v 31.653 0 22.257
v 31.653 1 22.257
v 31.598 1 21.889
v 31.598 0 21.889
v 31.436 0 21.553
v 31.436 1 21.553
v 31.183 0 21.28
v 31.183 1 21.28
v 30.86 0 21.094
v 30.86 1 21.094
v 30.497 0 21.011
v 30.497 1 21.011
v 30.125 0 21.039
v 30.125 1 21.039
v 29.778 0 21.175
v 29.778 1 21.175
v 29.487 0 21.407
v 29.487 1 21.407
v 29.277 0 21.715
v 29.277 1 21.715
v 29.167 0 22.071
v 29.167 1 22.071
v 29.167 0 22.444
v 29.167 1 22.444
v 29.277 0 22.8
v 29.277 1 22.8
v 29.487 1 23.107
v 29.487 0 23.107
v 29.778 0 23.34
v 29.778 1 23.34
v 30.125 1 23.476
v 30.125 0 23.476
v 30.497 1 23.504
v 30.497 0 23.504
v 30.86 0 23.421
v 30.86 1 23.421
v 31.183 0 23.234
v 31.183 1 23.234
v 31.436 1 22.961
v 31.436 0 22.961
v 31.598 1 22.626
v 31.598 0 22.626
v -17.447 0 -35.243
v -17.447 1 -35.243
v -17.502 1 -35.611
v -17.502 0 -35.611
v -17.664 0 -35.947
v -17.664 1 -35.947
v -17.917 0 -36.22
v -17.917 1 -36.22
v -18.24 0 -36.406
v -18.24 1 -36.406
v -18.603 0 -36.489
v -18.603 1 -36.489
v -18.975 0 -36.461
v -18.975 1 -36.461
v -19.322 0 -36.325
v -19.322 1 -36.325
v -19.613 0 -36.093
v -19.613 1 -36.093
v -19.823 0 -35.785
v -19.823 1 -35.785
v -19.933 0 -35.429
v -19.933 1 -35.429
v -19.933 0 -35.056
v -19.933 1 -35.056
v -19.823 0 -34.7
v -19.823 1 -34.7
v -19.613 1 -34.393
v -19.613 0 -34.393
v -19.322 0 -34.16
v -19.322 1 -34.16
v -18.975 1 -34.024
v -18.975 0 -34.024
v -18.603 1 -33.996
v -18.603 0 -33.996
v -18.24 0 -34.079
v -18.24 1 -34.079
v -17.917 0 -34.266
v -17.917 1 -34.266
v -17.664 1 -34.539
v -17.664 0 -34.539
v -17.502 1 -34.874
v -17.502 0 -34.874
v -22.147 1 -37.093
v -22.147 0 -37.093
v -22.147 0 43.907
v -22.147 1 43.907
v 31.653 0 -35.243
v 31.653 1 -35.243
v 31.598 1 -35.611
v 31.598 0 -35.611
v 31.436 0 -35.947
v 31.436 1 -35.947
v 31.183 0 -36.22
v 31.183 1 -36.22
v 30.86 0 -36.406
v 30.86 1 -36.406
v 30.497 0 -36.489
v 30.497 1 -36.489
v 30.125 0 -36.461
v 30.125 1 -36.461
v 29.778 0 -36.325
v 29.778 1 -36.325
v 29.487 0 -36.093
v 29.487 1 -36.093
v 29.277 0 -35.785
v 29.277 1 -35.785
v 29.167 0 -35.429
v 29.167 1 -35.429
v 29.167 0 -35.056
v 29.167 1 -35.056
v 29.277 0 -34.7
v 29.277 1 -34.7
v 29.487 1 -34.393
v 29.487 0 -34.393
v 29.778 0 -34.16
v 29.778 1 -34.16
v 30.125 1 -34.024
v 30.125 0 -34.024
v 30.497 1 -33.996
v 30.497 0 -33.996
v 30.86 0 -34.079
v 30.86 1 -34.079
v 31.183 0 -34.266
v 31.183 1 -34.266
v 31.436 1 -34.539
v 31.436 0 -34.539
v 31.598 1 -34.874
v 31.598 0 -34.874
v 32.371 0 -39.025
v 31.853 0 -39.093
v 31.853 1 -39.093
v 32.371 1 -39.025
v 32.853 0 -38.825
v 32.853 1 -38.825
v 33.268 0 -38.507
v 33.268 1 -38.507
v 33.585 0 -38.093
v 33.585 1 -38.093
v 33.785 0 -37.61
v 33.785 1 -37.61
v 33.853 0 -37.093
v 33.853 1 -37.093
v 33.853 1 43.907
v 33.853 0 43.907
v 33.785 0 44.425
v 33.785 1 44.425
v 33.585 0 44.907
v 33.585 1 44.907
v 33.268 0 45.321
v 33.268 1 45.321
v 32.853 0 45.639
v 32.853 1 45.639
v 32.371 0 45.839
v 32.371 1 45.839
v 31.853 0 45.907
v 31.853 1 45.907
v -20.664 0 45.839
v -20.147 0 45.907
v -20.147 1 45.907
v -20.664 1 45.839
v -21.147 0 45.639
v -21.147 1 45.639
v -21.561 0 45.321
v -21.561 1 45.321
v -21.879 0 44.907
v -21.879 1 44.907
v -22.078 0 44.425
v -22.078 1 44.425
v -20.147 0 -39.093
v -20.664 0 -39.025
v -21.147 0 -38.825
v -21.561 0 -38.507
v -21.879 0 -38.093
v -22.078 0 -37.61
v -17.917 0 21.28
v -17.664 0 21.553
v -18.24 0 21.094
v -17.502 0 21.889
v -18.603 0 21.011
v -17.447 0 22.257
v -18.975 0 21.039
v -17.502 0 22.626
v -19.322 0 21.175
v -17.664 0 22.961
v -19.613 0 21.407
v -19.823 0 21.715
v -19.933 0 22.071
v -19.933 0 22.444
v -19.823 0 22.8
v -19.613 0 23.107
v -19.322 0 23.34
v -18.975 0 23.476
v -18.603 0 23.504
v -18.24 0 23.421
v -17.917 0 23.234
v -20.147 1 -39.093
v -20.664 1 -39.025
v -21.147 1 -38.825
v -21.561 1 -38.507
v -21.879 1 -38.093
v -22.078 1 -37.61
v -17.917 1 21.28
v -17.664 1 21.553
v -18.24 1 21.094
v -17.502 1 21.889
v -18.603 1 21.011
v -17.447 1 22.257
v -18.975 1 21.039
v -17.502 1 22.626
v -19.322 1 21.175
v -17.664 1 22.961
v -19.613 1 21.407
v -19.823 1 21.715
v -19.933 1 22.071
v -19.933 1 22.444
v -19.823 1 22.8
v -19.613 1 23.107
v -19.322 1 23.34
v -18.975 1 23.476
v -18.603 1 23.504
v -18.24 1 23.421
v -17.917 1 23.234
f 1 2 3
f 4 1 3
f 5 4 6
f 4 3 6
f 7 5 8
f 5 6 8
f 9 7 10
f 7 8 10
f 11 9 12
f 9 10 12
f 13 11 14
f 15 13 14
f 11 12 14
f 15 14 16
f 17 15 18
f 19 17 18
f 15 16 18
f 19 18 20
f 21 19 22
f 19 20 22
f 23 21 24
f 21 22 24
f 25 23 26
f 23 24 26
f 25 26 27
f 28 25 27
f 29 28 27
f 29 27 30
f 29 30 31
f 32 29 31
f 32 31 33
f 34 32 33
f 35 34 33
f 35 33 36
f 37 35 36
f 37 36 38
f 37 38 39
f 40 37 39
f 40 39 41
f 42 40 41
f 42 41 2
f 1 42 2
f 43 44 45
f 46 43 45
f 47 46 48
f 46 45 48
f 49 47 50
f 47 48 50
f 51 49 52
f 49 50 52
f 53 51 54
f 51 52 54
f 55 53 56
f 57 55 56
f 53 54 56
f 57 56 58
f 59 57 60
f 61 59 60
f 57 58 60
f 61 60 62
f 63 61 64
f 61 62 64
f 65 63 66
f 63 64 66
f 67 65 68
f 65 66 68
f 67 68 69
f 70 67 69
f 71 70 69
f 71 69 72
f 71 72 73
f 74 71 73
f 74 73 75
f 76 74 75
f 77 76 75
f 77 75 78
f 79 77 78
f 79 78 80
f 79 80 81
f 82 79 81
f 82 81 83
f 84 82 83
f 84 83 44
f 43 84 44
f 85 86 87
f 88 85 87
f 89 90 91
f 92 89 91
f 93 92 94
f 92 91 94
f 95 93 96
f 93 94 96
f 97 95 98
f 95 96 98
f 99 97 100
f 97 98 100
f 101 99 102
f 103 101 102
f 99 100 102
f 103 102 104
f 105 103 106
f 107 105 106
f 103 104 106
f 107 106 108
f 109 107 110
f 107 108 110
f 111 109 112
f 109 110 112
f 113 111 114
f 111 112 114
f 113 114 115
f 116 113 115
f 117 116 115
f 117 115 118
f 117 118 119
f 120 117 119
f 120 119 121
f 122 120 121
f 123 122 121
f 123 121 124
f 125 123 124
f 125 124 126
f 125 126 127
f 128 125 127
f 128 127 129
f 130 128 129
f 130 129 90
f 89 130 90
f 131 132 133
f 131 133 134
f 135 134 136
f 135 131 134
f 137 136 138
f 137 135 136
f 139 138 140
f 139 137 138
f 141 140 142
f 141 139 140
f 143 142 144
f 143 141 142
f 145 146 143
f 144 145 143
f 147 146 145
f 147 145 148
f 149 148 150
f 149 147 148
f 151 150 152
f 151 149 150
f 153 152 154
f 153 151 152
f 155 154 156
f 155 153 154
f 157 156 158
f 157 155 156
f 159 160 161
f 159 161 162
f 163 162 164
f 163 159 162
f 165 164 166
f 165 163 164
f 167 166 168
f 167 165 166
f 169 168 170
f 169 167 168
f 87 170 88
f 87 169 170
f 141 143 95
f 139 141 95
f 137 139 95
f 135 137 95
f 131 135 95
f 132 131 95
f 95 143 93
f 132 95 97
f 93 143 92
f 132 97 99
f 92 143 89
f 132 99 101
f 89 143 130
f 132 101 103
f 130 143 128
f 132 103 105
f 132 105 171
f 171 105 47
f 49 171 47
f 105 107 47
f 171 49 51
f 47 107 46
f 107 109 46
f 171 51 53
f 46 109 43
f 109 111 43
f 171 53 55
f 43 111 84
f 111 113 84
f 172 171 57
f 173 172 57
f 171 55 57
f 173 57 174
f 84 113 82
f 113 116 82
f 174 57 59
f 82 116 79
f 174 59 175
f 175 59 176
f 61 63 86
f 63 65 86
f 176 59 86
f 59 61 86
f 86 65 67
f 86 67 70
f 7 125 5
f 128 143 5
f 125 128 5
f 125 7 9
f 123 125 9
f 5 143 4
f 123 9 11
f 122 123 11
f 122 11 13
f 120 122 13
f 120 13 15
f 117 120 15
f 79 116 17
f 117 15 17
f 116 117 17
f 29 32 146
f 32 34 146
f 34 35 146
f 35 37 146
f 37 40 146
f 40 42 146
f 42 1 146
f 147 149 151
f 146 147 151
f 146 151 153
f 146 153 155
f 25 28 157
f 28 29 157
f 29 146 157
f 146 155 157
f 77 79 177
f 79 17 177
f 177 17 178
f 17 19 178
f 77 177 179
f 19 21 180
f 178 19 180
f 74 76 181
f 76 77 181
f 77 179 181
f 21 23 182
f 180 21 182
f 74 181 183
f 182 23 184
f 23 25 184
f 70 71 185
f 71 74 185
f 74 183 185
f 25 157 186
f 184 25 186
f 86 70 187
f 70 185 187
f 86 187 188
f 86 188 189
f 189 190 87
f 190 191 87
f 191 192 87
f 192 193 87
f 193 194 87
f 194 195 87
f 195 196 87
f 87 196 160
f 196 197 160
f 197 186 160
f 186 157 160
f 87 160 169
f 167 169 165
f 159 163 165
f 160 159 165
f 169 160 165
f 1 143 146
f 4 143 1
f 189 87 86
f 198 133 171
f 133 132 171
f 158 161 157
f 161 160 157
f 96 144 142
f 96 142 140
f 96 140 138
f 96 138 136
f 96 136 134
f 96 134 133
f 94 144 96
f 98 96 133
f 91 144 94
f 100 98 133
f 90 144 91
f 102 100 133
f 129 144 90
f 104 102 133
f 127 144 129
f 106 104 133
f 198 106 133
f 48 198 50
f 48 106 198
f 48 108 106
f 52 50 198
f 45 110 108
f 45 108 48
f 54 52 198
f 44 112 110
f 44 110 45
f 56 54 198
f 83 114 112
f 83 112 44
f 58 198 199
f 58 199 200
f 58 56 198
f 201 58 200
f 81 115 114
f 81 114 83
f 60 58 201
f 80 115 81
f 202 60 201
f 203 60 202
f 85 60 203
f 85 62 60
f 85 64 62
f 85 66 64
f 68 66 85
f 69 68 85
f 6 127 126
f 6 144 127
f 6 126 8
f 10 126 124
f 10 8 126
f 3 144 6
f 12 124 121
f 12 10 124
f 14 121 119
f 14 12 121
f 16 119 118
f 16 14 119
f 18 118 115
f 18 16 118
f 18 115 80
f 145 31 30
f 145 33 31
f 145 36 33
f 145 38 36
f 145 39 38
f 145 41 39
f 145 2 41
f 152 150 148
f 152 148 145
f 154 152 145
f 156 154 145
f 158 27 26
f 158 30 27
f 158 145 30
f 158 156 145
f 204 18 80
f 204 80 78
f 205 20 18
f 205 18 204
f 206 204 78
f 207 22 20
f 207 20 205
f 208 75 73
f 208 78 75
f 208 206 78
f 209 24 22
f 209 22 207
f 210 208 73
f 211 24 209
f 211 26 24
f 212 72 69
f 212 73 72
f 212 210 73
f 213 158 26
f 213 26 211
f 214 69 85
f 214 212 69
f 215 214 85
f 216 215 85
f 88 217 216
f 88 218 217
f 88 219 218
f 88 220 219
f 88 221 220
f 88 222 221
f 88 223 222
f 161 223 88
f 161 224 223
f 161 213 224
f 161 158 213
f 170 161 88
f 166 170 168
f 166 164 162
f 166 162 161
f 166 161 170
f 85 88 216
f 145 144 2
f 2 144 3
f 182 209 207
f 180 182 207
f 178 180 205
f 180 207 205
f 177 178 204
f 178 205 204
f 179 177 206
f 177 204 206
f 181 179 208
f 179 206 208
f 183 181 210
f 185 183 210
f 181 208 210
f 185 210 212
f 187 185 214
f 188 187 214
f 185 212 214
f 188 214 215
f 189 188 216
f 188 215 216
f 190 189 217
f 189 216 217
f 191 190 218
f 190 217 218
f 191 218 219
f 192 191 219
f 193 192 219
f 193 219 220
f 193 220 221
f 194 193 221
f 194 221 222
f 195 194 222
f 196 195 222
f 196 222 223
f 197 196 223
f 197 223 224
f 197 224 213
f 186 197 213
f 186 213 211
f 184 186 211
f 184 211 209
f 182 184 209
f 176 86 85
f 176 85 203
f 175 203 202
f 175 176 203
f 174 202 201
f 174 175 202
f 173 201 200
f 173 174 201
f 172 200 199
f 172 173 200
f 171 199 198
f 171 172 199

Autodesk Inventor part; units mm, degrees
ref_plane "YZ Plane" through (0, 0, 0) normal (1, 0, 0) x (0, 1, 0)
ref_plane "XZ Plane" through (0, 0, 0) normal (0, 1, 0) x (-1, 0, 0)
ref_plane "XY Plane" through (0, 0, 0) normal (0, 0, 1) x (1, 0, 0)
sketch "Sketch1" plane through (0, 0, 0) normal (0, 1, 0) x (-1, 0, 0)
  line L0 (20.1466, 45.9072) -> (-31.8534, 45.9072)
  line L1 (-33.8534, 43.9072) -> (-33.8534, -37.0928)
  line L2 (-31.8534, -39.0928) -> (20.1466, -39.0928)
  line L3 (22.1466, -37.0928) -> (22.1466, 43.9072)
  arc A0 (22.1466, 43.9072) -> (20.1466, 45.9072) centre (20.1466, 43.9072) ccw
  arc A1 (20.1466, -39.0928) -> (22.1466, -37.0928) centre (20.1466, -37.0928) ccw
  arc A2 (-33.8534, -37.0928) -> (-31.8534, -39.0928) centre (-31.8534, -37.0928) ccw
  arc A3 (-31.8534, 45.9072) -> (-33.8534, 43.9072) centre (-31.8534, 43.9072) ccw
  point P0 (0, 0)
  point P1 (22.1466, 45.9072)
  point P2 (-33.8534, -39.0928)
  point P3 (-33.8534, 45.9072)
  point P4 (22.1466, -39.0928)
  dimension "d0" = 85
  dimension "d1" = 56
  dimension "d4" = 2
extrude "Extrusion1" add sketch "Sketch1" along normal blind 1
sketch "Sketch2" plane through (0, 1, 0) normal (0, 1, 0) x (1, 0, 0)
  circle A0 centre (-18.6966, 35.2428) radius 1.25
  line L0 (-22.1466, 37.0928) -> (-22.1466, -43.9072) projected
  line L1 (31.8534, 39.0928) -> (-20.1466, 39.0928) projected
  circle A1 centre (30.4034, 35.2428) radius 1.25
  circle A2 centre (-18.6966, -22.2572) radius 1.25
  circle A3 centre (30.4034, -22.2572) radius 1.25
  line L2 (33.8534, -43.9072) -> (33.8534, 37.0928) projected
  point P0 (0, 0)
  dimension "d5" = 2.5
  dimension "d6" = 3.45
  dimension "d7" = 3.85
  dimension "d8" = 2.5
  dimension "d9" = 3.85
  dimension "d10" = 3.45
  dimension "d11" = 2.5
  dimension "d12" = 3.45
  dimension "d13" = 57.5
  dimension "d14" = 57.5
  dimension "d15" = 2.5
  dimension "d16" = 3.45
extrude "Extrusion2" cut sketch "Sketch2" against normal up to next
equation "\"d8\" = d5"
equation "\"d9\" = d7"
equation "\"d10\" = d6"
equation "\"d11\" = d5"
equation "\"d12\" = d6"
equation "\"d14\" = d13"
equation "\"d15\" = d5"
equation "\"d16\" = d6"
properties part number "RasPI"
